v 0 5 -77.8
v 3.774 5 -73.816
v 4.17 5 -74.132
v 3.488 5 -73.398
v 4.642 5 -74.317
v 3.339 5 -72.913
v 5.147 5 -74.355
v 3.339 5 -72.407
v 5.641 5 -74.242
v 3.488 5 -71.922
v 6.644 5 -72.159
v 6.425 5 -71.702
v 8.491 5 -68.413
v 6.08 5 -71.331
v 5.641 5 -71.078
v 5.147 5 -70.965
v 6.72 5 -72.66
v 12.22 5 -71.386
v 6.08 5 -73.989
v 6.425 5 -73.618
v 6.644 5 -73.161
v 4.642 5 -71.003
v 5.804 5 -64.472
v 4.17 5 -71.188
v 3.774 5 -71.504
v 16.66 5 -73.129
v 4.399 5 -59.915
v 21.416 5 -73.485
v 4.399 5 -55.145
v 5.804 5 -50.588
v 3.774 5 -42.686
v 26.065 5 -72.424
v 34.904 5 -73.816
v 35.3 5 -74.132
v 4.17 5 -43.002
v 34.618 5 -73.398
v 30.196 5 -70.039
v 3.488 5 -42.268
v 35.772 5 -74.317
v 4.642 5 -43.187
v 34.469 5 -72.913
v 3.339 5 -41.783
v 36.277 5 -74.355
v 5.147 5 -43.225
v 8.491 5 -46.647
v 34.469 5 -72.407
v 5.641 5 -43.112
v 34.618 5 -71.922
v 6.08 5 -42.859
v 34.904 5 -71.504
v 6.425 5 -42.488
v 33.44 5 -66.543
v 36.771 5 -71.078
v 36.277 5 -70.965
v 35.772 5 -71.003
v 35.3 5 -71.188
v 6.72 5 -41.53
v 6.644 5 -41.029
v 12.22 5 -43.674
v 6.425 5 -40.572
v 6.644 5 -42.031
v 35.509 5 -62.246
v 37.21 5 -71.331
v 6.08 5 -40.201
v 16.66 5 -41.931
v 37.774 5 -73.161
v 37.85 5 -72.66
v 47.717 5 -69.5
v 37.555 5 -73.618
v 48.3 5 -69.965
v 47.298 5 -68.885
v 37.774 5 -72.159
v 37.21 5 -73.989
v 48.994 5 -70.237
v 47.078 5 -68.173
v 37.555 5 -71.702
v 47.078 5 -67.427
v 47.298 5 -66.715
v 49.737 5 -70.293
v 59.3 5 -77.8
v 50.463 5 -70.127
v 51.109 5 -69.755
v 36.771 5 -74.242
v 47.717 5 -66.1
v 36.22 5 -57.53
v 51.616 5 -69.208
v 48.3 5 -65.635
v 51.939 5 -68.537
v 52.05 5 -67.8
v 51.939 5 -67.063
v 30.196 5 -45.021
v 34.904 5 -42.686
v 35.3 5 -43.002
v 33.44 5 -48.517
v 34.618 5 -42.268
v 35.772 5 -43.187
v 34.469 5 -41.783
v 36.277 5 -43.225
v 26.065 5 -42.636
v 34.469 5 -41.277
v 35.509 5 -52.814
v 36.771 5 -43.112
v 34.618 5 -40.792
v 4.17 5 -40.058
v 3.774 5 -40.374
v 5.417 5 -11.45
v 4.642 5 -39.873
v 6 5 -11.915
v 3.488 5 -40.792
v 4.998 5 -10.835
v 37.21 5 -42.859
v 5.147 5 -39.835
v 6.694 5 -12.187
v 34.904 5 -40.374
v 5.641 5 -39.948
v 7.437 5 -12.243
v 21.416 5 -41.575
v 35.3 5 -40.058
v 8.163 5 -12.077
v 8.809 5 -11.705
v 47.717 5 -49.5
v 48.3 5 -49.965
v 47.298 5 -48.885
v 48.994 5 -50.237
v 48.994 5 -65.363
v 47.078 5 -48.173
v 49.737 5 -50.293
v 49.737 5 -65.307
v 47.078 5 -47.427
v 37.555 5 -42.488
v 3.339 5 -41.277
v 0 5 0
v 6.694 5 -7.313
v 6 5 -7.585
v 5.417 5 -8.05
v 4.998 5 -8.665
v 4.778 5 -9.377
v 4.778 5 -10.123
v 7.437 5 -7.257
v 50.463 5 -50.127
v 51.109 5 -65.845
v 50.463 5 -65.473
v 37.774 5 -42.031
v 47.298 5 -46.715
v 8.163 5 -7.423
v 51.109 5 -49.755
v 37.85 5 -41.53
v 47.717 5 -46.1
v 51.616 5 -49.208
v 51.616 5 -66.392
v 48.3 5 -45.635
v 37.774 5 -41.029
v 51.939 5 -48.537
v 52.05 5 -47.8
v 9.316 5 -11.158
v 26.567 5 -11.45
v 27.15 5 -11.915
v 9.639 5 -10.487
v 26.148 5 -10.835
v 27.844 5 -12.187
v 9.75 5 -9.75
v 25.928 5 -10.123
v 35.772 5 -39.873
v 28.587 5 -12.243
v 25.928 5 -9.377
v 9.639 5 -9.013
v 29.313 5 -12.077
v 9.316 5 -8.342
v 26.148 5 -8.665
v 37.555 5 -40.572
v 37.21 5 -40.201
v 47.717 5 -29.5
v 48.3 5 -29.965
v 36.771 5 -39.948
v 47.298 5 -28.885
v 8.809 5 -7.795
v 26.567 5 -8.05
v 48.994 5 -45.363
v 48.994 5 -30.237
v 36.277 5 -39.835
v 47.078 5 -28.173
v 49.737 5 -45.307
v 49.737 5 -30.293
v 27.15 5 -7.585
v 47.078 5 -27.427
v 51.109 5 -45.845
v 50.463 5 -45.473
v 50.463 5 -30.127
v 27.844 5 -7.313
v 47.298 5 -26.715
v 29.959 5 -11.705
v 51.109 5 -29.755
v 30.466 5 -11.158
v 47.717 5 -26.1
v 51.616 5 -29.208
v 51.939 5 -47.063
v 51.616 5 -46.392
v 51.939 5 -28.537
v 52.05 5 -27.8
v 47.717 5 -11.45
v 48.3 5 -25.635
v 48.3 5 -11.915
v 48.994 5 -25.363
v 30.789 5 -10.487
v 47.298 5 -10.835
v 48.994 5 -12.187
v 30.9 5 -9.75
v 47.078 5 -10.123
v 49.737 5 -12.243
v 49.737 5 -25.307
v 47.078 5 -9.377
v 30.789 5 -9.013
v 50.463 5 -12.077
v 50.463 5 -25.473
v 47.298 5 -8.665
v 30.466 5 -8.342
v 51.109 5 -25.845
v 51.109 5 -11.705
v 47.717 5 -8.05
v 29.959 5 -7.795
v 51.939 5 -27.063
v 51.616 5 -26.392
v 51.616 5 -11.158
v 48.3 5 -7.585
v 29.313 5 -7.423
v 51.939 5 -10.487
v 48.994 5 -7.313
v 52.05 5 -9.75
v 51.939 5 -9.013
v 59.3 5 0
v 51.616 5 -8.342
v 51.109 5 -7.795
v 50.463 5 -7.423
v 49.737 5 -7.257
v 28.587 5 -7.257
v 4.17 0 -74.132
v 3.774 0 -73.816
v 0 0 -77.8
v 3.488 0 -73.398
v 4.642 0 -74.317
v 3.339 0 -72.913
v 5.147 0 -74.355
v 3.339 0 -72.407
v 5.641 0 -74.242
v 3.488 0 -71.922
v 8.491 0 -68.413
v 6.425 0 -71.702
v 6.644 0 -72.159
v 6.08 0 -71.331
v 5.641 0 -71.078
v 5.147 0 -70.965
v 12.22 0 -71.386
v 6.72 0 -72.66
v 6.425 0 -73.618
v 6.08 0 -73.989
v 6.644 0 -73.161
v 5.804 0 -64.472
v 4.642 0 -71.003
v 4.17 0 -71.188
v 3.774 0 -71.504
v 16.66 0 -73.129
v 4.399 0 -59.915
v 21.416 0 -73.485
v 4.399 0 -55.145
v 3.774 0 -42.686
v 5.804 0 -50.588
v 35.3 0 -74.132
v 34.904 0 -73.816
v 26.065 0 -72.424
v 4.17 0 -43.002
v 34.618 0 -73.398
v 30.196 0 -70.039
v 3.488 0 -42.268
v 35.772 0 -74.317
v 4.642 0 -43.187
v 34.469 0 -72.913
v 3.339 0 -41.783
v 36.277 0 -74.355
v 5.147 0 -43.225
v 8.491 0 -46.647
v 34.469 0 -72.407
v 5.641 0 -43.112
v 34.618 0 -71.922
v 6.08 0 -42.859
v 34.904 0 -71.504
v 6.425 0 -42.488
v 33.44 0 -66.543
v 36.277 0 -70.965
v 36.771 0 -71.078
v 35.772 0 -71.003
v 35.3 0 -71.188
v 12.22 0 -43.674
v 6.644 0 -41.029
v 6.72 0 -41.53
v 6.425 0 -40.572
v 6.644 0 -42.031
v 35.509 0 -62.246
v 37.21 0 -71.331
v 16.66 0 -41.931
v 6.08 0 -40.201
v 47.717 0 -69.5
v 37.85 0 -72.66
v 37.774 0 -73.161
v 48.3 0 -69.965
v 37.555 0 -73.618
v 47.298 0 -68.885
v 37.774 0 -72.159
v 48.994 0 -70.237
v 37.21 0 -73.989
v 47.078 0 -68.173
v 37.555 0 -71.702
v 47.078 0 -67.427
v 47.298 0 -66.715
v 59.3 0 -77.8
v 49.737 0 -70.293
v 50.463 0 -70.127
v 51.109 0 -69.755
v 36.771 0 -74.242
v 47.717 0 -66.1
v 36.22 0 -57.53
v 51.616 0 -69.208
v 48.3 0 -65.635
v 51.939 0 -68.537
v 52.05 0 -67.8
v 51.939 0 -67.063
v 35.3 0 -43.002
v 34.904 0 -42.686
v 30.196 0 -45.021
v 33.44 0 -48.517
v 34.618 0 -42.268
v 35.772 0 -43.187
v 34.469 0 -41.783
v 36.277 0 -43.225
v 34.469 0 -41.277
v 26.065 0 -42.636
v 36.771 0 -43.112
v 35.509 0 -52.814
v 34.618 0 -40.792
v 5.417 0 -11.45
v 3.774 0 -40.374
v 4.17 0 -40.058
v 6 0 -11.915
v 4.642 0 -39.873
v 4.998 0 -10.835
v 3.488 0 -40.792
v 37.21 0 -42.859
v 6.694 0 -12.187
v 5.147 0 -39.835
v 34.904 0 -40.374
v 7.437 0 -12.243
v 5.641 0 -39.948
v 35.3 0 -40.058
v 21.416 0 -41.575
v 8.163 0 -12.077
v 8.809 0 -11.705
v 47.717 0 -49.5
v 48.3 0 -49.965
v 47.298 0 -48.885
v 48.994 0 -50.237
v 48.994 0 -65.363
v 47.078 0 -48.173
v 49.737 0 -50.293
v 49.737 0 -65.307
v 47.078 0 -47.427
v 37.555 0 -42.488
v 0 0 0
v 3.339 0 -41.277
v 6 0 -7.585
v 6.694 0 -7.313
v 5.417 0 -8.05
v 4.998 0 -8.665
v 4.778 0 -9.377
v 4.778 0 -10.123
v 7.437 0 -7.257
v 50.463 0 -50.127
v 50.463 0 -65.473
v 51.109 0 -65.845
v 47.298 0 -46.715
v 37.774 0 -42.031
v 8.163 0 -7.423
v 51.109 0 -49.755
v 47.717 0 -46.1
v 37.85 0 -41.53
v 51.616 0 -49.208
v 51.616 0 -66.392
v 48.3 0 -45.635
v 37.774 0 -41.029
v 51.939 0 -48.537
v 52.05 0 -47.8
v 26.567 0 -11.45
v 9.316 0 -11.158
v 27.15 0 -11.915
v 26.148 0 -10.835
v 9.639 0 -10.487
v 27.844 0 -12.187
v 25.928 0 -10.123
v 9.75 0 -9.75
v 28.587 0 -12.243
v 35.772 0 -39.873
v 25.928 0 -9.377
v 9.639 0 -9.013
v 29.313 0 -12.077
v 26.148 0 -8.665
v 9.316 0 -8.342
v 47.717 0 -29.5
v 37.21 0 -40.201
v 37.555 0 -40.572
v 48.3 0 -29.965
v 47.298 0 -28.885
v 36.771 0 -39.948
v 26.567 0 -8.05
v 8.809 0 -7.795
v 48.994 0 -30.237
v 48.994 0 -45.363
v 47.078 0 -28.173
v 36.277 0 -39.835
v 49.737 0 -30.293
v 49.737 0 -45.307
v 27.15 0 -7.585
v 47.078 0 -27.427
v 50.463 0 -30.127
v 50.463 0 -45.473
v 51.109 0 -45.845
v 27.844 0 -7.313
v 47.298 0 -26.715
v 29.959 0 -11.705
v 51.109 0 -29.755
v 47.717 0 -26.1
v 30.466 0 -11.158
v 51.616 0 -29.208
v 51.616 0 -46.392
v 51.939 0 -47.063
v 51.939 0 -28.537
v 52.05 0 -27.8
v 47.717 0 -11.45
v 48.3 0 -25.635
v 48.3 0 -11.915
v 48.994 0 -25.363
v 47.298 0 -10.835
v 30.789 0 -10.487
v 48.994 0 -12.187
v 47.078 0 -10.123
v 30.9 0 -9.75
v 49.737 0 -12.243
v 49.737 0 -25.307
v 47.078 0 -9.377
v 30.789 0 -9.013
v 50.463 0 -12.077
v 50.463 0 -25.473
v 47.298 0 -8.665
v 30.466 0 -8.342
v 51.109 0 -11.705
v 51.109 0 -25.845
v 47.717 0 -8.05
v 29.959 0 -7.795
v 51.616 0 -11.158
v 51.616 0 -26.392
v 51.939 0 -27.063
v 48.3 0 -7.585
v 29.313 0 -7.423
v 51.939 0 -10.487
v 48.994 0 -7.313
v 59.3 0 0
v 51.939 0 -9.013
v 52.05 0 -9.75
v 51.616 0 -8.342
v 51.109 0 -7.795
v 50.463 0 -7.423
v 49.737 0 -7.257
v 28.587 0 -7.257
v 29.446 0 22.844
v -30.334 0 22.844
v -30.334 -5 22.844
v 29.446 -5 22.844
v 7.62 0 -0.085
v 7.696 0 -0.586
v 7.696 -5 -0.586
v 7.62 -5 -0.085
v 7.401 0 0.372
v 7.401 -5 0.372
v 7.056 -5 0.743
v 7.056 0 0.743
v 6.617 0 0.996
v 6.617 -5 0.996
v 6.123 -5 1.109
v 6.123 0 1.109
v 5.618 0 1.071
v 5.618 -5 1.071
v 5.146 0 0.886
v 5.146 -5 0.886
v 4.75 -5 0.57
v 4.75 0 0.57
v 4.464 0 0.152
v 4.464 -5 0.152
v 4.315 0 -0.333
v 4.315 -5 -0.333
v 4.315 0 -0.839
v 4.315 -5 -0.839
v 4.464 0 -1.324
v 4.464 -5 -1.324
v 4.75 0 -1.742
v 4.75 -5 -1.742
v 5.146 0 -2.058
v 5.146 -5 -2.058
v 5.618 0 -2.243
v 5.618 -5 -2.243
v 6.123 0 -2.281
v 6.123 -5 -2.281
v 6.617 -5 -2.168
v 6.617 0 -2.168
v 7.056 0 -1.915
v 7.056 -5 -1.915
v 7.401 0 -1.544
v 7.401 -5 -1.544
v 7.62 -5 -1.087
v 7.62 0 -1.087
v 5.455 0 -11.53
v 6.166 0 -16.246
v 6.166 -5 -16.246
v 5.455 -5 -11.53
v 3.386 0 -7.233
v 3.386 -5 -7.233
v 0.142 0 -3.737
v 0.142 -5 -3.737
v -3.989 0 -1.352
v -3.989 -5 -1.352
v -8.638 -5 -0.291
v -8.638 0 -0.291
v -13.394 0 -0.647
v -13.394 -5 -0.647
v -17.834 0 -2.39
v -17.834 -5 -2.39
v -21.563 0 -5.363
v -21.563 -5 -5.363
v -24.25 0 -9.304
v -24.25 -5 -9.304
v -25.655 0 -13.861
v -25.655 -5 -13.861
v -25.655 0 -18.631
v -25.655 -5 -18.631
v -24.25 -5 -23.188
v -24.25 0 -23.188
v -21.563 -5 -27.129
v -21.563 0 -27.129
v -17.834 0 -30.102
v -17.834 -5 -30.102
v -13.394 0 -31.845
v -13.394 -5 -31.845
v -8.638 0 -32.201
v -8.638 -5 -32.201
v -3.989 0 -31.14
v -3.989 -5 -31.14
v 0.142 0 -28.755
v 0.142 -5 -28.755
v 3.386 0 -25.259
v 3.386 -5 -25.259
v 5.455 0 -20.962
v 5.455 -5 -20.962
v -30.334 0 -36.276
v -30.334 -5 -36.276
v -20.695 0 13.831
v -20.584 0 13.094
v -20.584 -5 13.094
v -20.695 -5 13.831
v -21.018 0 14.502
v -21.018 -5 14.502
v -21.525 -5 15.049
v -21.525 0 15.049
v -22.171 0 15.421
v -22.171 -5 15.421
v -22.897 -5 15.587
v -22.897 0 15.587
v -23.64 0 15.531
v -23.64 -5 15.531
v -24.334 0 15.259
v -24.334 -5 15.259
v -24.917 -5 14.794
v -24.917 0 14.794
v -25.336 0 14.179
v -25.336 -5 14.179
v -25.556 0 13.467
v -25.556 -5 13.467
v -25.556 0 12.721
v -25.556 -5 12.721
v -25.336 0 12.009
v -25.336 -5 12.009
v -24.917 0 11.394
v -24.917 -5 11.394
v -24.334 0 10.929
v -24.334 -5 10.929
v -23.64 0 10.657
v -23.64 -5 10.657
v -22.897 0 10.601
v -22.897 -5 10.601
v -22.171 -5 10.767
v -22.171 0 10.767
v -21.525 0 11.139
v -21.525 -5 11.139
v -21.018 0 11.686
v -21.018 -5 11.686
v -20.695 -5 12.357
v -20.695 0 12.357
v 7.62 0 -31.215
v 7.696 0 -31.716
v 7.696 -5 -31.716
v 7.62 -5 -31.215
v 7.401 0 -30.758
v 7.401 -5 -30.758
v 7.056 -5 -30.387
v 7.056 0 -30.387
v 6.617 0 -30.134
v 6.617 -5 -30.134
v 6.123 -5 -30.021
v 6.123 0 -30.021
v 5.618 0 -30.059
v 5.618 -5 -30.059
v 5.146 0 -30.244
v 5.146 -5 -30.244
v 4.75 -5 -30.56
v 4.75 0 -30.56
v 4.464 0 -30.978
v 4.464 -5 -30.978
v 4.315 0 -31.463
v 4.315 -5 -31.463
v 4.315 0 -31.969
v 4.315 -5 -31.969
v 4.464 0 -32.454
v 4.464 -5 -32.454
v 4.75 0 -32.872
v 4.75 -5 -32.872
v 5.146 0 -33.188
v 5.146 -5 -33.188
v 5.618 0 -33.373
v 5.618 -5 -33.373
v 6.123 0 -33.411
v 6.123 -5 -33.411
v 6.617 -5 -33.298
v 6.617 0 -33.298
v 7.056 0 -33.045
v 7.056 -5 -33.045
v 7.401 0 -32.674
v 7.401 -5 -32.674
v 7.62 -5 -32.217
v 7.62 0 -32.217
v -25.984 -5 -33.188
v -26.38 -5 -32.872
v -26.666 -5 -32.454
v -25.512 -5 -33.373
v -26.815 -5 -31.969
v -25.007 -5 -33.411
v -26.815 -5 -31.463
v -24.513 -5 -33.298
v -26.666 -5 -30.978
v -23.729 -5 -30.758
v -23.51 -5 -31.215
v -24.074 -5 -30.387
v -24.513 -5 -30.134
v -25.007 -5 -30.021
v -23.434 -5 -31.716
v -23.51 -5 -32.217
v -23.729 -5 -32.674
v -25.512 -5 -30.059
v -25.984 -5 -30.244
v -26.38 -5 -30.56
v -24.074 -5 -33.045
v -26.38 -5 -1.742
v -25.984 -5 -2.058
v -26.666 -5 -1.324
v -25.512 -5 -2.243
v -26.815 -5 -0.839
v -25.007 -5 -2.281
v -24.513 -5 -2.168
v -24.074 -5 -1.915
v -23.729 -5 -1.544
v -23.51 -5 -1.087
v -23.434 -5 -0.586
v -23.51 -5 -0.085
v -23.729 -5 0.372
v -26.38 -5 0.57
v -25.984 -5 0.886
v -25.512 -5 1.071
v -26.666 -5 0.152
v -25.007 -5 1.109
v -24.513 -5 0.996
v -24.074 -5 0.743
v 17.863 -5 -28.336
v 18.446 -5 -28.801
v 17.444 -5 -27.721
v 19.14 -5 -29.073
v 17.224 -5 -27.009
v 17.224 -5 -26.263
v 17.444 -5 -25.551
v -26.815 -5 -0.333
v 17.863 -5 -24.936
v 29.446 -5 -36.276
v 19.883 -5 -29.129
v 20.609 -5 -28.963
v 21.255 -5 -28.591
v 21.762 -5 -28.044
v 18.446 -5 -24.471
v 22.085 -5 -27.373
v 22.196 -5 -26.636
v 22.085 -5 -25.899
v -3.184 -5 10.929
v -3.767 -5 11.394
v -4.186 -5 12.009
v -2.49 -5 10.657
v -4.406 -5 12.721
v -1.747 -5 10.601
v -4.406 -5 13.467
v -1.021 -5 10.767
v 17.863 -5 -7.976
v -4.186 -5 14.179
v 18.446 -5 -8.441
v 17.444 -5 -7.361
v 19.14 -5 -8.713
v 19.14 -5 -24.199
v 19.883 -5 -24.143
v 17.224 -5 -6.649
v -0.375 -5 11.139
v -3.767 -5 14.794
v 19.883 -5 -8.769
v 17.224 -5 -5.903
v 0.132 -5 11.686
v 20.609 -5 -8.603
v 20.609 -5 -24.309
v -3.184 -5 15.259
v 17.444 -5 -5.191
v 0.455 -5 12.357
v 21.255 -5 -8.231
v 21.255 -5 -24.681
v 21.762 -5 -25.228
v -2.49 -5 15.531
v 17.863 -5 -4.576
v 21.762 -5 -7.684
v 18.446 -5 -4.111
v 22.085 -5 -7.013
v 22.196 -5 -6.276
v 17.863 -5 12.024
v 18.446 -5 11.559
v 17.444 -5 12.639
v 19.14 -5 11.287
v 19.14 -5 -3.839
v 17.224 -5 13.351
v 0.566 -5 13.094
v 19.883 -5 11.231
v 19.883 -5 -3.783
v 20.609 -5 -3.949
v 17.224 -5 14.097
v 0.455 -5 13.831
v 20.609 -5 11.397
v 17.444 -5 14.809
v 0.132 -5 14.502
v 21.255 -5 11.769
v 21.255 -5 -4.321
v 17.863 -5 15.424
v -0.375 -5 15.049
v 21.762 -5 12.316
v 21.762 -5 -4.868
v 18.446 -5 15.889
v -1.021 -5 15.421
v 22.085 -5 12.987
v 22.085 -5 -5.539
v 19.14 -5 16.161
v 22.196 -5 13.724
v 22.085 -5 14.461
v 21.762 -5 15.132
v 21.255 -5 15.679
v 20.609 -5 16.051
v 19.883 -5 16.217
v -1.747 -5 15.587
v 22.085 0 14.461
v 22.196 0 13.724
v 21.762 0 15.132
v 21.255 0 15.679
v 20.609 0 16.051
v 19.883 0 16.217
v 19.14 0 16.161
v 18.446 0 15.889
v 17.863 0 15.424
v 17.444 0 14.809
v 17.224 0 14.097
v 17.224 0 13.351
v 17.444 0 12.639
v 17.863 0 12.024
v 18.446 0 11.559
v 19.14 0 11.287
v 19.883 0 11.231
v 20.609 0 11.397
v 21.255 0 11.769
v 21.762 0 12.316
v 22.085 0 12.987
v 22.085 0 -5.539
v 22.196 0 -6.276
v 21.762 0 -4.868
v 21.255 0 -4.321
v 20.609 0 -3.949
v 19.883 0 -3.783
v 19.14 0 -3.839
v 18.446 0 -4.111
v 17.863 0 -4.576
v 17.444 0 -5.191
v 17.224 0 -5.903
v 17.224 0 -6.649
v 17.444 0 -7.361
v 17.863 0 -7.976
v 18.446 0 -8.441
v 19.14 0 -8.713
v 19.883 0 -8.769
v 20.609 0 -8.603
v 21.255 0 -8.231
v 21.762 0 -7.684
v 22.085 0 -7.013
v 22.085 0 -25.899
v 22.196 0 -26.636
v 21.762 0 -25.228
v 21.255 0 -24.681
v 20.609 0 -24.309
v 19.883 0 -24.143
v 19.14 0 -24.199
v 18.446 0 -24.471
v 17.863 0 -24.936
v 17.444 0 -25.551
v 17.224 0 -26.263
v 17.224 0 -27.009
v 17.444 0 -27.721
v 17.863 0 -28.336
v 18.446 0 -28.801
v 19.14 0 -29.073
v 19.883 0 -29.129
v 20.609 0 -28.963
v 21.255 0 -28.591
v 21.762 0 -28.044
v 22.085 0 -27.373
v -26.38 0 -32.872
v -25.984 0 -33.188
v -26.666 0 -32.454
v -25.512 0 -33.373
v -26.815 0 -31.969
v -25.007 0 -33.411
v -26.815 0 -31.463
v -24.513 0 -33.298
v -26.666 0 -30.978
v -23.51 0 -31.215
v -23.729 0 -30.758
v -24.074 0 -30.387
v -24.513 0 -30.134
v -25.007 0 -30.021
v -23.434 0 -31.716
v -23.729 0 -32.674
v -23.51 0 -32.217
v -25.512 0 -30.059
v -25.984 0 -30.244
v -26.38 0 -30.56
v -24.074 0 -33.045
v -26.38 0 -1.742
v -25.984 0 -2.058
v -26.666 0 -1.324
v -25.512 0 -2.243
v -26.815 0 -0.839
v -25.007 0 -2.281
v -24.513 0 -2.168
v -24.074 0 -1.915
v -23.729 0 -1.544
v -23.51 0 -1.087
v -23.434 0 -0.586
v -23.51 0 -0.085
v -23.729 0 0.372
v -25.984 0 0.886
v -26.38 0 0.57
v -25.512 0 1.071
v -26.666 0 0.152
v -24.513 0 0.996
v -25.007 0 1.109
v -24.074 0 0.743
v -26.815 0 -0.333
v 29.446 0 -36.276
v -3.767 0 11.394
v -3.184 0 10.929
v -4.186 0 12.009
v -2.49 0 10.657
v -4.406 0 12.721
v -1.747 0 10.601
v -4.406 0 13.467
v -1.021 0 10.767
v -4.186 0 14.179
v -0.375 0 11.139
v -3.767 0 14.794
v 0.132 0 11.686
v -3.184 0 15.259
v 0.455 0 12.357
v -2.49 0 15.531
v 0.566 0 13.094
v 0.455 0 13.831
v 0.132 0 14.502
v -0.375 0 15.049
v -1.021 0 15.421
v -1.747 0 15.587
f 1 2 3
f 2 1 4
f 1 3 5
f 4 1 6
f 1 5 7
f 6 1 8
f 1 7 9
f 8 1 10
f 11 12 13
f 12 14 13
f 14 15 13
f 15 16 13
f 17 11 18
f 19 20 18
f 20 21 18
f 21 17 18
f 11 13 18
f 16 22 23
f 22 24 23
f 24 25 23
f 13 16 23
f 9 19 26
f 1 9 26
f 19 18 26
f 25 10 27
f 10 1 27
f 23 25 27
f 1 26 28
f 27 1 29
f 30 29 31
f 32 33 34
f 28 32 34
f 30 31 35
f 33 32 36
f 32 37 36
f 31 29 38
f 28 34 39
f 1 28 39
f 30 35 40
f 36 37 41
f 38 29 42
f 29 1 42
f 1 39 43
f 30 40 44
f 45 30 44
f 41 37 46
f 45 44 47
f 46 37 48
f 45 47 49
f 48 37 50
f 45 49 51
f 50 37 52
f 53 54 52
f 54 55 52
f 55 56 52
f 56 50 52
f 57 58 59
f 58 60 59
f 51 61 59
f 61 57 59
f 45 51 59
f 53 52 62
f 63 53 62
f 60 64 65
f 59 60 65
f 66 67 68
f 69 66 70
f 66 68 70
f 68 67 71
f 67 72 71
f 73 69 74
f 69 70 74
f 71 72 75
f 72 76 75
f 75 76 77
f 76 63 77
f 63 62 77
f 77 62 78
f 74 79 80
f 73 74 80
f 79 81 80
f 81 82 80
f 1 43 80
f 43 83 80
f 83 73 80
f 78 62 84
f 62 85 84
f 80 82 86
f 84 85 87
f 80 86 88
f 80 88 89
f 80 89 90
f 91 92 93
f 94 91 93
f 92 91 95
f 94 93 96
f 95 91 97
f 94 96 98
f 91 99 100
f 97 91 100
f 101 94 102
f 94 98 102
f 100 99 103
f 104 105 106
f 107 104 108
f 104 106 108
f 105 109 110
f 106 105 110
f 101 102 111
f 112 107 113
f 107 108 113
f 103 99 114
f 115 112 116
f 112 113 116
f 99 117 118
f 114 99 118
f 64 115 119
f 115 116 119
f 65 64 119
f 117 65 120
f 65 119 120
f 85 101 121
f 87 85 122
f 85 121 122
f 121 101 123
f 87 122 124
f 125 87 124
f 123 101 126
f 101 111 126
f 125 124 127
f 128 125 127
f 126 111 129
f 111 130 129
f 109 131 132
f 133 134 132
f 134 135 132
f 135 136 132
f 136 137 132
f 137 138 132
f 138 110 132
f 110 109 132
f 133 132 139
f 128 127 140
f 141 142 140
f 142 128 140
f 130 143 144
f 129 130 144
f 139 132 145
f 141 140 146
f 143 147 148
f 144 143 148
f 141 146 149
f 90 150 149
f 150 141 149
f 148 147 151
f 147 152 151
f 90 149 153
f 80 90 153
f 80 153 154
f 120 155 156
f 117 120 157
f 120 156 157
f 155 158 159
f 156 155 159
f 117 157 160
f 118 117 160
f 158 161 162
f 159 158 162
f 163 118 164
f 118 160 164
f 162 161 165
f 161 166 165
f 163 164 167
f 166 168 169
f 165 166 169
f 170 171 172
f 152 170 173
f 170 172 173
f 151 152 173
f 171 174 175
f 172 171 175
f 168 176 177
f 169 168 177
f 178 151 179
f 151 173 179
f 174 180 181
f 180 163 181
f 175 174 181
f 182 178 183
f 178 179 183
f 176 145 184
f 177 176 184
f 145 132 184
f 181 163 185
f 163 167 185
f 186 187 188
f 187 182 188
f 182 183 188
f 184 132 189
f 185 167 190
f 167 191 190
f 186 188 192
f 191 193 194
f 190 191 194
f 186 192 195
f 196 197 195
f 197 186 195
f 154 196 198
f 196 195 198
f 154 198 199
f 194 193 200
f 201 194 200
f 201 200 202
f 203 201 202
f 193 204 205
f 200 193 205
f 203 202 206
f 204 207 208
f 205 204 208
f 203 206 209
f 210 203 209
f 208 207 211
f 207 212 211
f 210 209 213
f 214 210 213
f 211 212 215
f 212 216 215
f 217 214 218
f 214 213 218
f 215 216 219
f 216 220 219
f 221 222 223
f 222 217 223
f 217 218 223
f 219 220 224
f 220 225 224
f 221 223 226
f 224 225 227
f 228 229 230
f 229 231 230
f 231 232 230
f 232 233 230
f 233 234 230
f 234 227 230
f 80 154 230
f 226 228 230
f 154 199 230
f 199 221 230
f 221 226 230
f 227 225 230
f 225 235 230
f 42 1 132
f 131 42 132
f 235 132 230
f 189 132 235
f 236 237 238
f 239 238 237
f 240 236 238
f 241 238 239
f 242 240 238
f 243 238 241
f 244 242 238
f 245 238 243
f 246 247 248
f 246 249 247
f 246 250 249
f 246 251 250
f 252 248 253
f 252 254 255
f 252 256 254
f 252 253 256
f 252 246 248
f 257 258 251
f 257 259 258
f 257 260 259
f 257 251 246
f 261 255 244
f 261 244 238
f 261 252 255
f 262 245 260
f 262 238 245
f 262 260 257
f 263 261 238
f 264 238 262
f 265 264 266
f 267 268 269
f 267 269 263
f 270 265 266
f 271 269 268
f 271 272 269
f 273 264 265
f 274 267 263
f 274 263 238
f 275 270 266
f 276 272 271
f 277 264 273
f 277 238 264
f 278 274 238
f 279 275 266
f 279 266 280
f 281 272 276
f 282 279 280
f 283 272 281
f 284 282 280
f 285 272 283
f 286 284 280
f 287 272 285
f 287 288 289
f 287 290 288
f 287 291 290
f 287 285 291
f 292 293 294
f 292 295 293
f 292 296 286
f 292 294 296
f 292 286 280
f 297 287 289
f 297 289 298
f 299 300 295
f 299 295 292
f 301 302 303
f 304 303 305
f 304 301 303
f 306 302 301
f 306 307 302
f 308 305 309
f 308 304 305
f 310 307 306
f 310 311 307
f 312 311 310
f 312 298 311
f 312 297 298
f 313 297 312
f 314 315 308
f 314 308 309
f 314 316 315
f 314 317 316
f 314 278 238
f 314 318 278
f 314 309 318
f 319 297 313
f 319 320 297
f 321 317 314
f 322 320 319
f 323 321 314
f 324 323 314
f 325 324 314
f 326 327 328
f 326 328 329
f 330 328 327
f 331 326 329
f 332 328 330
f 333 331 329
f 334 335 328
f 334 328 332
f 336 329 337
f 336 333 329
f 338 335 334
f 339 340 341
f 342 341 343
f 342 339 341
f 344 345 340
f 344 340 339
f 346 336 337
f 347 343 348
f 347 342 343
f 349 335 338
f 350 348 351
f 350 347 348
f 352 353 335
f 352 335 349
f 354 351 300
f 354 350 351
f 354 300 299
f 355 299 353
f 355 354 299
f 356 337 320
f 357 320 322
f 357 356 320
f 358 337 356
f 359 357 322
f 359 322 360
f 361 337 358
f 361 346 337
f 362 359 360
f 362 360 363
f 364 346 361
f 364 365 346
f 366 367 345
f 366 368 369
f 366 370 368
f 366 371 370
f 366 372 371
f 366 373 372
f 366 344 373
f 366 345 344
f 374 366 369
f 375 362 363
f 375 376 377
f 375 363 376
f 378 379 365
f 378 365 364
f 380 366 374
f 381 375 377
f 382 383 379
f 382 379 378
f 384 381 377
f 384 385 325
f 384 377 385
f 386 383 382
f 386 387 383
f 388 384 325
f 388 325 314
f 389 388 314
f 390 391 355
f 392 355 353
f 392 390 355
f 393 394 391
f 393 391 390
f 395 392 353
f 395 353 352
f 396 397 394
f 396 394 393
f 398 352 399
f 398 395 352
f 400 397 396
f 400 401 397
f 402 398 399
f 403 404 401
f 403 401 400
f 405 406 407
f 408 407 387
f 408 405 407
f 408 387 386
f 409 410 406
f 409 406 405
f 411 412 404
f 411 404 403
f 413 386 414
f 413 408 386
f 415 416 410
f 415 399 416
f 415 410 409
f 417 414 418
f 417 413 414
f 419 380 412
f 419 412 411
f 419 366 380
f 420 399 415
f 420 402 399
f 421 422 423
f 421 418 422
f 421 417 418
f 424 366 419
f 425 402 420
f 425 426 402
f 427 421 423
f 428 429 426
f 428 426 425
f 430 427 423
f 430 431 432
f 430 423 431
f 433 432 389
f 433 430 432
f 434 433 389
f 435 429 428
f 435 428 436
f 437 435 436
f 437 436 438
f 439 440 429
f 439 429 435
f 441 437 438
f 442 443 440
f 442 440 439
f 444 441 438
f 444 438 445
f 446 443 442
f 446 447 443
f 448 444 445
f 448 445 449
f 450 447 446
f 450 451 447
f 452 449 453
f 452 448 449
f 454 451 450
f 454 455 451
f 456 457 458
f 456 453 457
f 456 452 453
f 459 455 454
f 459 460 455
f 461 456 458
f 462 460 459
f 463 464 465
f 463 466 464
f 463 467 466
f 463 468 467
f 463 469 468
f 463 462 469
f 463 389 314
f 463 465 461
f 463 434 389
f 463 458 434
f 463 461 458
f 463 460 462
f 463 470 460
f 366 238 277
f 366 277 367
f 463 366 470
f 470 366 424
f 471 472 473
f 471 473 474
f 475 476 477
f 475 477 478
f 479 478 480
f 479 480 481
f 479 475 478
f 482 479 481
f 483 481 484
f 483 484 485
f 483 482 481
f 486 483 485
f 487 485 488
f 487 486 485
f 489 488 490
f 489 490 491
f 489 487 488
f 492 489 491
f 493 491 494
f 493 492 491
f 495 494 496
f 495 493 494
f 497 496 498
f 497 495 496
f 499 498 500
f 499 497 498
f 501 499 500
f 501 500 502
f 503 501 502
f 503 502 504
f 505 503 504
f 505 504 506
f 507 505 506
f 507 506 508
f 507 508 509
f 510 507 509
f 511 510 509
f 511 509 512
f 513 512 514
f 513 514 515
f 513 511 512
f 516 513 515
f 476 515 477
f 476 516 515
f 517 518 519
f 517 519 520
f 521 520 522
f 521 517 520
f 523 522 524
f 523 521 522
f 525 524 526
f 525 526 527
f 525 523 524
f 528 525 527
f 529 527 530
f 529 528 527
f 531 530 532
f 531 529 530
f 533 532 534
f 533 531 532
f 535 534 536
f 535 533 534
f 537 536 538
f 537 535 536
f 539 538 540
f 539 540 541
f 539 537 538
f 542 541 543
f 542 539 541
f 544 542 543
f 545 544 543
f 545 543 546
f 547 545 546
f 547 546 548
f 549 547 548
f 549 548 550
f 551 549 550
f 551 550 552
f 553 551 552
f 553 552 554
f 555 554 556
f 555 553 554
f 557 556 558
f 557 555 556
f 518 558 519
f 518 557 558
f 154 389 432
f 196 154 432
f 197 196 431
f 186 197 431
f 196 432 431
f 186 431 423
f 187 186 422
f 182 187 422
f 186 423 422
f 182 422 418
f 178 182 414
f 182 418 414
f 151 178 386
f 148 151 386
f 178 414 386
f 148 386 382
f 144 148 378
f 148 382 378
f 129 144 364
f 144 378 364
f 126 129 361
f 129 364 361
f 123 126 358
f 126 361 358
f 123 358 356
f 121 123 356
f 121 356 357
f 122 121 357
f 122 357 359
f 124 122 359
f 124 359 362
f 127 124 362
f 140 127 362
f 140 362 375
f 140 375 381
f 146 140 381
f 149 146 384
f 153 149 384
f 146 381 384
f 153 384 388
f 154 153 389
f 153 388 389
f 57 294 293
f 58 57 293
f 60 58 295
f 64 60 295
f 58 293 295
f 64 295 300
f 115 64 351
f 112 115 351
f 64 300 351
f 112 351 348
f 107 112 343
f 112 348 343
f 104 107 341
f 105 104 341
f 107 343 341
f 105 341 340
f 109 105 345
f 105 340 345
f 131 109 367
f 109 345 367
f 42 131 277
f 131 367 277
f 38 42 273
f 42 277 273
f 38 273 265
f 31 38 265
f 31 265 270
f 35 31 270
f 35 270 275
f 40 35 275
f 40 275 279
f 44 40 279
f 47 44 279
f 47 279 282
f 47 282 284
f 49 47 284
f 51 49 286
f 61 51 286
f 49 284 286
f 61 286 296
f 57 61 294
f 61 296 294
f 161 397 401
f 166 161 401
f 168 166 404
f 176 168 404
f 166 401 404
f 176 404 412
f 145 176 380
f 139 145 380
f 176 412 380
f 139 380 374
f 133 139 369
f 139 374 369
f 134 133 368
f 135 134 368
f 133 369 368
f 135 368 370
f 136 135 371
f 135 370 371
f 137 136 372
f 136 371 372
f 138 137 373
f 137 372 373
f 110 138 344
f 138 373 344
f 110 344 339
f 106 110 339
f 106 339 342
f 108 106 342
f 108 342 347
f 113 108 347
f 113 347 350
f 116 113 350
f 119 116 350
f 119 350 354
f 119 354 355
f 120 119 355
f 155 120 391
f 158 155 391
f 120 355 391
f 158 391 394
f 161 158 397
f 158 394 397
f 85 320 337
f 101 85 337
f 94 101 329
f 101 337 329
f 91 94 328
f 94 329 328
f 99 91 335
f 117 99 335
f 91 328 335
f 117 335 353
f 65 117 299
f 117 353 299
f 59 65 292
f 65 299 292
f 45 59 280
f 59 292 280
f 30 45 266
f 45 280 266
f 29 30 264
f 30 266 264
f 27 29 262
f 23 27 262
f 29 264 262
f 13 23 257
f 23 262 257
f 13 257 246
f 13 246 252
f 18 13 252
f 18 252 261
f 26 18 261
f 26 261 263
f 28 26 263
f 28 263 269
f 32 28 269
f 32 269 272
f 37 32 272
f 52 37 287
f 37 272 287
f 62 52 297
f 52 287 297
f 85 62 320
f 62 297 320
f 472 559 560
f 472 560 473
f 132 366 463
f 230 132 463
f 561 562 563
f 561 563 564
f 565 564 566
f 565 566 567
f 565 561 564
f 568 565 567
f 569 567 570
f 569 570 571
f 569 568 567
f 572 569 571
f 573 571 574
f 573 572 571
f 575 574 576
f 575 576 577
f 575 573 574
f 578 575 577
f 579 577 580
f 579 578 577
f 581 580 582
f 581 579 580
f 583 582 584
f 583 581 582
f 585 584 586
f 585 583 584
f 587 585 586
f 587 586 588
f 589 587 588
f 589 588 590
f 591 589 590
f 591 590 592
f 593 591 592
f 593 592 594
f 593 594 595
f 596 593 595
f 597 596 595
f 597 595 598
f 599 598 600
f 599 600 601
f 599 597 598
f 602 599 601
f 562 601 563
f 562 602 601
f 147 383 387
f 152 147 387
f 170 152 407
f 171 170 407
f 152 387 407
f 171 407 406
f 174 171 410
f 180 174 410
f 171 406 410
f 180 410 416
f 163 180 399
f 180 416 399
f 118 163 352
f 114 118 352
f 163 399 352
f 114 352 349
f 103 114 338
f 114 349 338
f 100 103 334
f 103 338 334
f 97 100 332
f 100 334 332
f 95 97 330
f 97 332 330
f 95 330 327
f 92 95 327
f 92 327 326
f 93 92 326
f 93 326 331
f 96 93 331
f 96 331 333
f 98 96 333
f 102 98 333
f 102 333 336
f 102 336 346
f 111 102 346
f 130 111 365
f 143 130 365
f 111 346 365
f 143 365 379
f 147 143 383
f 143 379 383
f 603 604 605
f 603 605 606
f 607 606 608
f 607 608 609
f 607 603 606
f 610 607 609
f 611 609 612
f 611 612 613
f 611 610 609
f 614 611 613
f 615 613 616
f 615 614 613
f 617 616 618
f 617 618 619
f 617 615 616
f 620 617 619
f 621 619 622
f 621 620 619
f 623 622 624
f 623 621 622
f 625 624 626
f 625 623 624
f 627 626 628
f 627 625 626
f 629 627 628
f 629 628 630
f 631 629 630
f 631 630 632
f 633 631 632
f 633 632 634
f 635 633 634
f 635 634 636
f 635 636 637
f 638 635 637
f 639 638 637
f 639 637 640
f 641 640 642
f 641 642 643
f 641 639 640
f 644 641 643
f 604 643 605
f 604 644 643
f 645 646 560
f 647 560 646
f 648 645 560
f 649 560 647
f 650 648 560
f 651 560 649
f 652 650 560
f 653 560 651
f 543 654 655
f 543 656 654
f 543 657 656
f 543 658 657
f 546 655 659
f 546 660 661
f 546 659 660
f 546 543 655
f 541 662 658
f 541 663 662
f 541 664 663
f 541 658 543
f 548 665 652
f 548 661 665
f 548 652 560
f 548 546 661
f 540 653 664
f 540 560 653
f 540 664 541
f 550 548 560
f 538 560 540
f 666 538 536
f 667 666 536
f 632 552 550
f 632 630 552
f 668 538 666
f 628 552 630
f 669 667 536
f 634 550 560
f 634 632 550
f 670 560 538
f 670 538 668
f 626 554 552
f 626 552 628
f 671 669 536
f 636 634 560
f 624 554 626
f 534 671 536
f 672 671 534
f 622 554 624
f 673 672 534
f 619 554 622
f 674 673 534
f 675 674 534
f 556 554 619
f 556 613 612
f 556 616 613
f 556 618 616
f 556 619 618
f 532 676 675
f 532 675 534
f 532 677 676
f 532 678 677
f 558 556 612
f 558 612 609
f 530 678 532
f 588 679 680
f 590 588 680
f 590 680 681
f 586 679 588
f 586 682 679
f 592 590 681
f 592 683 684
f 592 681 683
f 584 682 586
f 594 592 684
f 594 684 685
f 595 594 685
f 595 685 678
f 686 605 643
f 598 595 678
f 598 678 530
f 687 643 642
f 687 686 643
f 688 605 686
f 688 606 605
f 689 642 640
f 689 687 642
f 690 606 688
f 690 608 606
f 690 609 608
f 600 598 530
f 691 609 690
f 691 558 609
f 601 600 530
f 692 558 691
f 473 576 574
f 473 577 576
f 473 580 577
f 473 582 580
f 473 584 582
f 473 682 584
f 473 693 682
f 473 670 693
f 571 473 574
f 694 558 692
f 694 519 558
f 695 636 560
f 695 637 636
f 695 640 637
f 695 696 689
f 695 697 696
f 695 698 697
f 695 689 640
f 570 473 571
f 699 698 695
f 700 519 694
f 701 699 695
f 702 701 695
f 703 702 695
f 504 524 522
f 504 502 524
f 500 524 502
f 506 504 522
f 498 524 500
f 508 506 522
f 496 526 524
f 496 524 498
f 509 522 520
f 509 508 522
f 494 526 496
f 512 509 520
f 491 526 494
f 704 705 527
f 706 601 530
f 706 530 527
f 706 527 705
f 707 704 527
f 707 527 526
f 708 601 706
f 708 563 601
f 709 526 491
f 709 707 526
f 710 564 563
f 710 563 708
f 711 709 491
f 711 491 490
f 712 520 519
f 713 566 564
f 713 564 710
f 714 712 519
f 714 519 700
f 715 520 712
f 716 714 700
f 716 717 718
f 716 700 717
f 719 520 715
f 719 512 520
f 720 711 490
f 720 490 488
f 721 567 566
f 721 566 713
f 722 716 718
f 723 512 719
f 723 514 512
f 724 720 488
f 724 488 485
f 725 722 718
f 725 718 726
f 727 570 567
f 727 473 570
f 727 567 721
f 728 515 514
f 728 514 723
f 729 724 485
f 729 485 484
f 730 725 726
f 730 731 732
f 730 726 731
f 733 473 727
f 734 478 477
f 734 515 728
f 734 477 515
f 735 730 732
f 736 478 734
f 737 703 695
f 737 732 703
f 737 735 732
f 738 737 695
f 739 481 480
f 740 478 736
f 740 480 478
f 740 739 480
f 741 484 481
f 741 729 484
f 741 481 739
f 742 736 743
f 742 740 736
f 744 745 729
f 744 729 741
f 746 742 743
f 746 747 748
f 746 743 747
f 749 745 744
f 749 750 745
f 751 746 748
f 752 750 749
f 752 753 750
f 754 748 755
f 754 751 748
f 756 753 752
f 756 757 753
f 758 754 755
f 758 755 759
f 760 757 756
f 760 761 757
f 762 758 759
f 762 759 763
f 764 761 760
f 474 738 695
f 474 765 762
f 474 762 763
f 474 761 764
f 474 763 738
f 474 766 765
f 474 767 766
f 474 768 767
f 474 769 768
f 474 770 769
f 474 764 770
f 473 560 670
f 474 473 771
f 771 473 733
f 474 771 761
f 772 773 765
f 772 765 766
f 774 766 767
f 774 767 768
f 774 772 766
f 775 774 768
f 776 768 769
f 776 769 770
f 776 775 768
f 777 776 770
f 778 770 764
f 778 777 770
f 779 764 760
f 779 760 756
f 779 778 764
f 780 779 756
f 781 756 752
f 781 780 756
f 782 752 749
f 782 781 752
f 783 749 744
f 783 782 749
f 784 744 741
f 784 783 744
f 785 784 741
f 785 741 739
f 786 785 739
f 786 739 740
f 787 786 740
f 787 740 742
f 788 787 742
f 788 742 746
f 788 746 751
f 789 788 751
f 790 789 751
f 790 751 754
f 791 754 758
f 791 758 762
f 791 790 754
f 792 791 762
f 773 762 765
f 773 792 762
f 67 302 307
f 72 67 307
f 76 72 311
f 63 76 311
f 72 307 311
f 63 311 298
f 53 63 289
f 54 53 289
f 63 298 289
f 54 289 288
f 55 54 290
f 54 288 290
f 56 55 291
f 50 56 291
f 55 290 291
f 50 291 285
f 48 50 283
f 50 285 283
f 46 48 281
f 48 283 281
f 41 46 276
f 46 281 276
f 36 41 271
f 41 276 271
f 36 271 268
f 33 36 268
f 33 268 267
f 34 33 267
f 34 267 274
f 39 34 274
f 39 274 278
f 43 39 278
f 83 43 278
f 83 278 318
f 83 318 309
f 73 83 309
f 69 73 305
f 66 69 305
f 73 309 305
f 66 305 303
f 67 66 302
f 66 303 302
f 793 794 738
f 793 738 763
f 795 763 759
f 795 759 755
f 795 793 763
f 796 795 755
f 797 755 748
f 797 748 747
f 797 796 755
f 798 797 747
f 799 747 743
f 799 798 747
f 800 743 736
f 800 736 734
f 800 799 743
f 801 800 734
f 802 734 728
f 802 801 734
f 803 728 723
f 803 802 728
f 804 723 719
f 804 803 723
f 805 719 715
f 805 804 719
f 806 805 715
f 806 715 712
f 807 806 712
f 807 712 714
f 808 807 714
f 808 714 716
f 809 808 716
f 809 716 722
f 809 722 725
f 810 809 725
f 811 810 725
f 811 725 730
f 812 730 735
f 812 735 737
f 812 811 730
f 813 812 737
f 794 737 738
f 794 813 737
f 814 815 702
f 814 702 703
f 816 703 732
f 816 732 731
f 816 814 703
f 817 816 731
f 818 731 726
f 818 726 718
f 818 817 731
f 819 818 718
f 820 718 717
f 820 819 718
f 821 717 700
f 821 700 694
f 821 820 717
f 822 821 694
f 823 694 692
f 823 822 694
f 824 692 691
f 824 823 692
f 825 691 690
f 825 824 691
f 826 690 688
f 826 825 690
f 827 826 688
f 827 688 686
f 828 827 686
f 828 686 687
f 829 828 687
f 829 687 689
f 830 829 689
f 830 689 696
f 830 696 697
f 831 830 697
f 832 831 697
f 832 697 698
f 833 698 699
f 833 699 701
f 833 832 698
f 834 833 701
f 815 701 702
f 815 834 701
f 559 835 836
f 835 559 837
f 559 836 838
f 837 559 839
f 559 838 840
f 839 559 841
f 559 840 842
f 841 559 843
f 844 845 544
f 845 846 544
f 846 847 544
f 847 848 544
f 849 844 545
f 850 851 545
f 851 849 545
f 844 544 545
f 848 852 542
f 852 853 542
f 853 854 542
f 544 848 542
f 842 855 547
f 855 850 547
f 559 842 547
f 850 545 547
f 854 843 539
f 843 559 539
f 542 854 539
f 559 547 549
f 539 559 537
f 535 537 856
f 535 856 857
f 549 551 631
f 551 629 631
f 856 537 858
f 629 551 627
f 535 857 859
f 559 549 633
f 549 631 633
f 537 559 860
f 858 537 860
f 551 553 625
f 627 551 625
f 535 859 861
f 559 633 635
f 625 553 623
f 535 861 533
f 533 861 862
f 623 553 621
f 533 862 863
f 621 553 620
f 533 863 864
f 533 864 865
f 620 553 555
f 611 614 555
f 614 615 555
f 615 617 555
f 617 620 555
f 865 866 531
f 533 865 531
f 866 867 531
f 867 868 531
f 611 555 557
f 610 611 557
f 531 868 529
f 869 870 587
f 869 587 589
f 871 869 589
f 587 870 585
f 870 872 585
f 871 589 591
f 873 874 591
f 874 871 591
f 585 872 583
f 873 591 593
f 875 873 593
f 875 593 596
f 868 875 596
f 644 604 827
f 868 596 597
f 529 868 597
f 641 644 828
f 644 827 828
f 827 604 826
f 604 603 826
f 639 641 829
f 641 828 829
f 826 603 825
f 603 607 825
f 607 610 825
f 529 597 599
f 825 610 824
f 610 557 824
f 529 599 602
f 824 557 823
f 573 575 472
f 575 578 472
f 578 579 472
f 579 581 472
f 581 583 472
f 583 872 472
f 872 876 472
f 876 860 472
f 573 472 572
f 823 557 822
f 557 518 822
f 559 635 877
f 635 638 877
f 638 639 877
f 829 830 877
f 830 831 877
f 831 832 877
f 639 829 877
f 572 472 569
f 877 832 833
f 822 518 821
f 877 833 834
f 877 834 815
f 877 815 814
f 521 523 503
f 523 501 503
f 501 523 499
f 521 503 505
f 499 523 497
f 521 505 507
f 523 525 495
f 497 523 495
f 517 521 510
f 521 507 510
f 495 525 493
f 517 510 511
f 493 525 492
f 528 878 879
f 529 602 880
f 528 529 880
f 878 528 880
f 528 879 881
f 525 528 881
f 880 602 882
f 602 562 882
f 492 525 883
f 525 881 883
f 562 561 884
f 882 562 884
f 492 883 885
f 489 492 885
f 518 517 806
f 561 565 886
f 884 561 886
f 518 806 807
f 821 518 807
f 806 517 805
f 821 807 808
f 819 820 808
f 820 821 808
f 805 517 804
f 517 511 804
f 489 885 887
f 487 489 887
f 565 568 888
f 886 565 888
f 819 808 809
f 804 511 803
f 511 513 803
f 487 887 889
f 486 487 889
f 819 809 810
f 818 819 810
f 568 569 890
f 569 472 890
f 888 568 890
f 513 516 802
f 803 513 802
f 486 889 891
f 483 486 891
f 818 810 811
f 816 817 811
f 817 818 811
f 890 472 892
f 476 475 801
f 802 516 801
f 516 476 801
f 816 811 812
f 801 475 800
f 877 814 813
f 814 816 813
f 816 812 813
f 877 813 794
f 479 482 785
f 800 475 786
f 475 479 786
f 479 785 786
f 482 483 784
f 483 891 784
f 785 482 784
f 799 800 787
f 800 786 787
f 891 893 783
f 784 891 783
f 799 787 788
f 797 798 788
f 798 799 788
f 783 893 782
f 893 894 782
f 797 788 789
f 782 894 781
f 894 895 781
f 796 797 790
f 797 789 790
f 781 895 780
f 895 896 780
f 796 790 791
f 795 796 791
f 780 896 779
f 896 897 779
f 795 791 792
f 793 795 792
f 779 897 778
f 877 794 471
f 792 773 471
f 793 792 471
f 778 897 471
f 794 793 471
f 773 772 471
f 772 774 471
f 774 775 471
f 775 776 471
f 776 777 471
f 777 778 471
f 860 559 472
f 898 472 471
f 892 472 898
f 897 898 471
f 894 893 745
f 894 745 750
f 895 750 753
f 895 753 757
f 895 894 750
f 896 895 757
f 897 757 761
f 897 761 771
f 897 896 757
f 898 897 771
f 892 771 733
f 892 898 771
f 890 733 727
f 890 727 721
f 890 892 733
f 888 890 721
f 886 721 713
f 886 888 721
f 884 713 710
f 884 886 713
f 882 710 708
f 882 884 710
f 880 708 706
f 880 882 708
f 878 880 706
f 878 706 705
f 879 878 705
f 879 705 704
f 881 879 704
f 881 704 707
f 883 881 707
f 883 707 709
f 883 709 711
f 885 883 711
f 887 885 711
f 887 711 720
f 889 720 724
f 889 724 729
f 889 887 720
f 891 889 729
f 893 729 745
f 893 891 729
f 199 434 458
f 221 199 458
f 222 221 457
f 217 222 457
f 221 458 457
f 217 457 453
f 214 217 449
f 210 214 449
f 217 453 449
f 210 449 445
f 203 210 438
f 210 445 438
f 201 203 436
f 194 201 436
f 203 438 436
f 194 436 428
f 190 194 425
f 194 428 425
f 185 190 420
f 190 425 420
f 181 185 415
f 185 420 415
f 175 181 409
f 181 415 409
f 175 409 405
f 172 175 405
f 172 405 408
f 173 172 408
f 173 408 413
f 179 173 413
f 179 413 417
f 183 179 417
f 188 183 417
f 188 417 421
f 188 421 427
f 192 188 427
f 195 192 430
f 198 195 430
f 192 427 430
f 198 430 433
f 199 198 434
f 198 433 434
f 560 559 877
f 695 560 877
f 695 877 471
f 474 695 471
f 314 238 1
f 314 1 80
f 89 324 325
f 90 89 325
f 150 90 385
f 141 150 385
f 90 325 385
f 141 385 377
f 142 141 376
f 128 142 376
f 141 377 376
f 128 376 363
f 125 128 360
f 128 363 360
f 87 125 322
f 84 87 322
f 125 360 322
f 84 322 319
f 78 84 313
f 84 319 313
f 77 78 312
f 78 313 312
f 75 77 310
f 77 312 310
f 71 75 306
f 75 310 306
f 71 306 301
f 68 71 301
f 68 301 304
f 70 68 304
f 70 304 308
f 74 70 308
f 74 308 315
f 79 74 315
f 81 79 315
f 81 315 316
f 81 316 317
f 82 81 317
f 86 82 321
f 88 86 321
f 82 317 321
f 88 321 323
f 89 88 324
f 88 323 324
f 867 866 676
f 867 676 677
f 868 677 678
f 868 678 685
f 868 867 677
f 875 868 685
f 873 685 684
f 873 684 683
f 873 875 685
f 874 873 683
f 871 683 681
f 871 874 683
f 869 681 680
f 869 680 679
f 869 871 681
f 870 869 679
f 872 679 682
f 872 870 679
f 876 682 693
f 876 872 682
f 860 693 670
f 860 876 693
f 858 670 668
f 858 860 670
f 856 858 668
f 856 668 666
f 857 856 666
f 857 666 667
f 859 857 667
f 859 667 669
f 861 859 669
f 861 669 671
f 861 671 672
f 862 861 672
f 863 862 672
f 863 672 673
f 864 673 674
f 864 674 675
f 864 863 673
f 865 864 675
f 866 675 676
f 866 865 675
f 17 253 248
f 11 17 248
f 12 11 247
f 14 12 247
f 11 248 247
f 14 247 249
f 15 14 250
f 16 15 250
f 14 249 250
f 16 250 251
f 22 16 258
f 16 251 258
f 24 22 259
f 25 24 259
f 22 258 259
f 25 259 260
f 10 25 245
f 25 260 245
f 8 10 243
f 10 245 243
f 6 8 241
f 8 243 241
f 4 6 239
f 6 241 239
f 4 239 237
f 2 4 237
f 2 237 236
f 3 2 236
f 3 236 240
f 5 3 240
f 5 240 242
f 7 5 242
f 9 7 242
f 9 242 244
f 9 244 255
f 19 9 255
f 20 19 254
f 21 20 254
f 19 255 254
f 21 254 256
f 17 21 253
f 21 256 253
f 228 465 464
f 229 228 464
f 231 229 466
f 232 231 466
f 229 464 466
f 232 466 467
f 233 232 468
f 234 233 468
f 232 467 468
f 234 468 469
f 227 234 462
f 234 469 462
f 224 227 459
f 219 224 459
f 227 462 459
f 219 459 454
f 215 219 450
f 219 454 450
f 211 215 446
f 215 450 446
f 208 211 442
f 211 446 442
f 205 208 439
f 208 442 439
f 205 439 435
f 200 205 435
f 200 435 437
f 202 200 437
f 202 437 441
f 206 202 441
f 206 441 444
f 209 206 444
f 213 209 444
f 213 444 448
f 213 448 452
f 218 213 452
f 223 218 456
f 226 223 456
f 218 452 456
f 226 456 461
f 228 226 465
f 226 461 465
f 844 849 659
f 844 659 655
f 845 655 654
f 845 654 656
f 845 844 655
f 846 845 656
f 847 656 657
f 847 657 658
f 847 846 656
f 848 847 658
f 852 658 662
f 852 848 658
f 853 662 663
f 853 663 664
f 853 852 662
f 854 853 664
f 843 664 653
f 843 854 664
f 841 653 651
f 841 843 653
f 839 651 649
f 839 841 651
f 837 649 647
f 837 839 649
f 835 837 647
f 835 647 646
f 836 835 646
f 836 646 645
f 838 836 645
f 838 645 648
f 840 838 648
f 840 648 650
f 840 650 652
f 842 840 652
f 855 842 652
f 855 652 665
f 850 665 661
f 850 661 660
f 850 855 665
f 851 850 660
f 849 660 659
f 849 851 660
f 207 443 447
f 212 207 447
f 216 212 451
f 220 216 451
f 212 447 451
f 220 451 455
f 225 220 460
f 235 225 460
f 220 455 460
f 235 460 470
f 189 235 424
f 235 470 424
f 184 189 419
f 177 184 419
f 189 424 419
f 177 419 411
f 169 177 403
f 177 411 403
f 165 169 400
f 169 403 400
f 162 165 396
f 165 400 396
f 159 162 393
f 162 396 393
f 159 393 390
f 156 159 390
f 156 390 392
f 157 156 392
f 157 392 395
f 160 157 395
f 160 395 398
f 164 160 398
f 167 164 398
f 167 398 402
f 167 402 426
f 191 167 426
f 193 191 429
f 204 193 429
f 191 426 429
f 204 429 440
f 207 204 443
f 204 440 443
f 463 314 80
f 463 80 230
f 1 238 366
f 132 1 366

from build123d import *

# Parameters (mm, degrees)
F0_W     = 59.3
F0_H     = 77.8
F0_R     = 1.7
F0_R_2   = 16
F0_R_3   = 2.5
F1_DEPTH = 5
F2_W     = 59.78
F2_H     = 59.12
F2_R     = 1.7
F2_R_2   = 16
F2_R_3   = 2.5
F3_DEPTH = 5


with BuildPart() as f1:
    # F0 (on Front) → F1 (new body)
    with BuildSketch(Plane.XZ):
        with Locations((29.65, -38.9)):
            Rectangle(F0_W, F0_H)
        with Locations((5.02, -72.66)):
            Circle(F0_R, mode=Mode.SUBTRACT)
        with Locations((5.02, -41.53)):
            Circle(F0_R, mode=Mode.SUBTRACT)
        with Locations((20.22, -57.53)):
            Circle(F0_R_2, mode=Mode.SUBTRACT)
        with Locations((36.15, -72.66)):
            Circle(F0_R, mode=Mode.SUBTRACT)
        with Locations((49.55, -67.8)):
            Circle(F0_R_3, mode=Mode.SUBTRACT)
        with Locations((36.15, -41.53)):
            Circle(F0_R, mode=Mode.SUBTRACT)
        with Locations((49.55, -47.8)):
            Circle(F0_R_3, mode=Mode.SUBTRACT)
        with Locations((7.25, -9.75)):
            Circle(F0_R_3, mode=Mode.SUBTRACT)
        with Locations((28.4, -9.75)):
            Circle(F0_R_3, mode=Mode.SUBTRACT)
        with Locations((49.55, -27.8)):
            Circle(F0_R_3, mode=Mode.SUBTRACT)
        with Locations((49.55, -9.75)):
            Circle(F0_R_3, mode=Mode.SUBTRACT)
    extrude(amount=-F1_DEPTH)


with BuildPart() as f3:
    # F2 (on Front) → F3 (new body)
    with BuildSketch(Plane.XZ):
        with Locations((-0.444, -6.716)):
            Rectangle(F2_W, F2_H)
        with Locations((-25.134, -31.716)):
            Circle(F2_R, mode=Mode.SUBTRACT)
        with Locations((-9.834, -16.246)):
            Circle(F2_R_2, mode=Mode.SUBTRACT)
        with Locations((5.996, -31.716)):
            Circle(F2_R, mode=Mode.SUBTRACT)
        with Locations((19.696, -26.636)):
            Circle(F2_R_3, mode=Mode.SUBTRACT)
        with Locations((-25.134, -0.586)):
            Circle(F2_R, mode=Mode.SUBTRACT)
        with Locations((-23.084, 13.094)):
            Circle(F2_R_3, mode=Mode.SUBTRACT)
        with Locations((-1.934, 13.094)):
            Circle(F2_R_3, mode=Mode.SUBTRACT)
        with Locations((5.996, -0.586)):
            Circle(F2_R, mode=Mode.SUBTRACT)
        with Locations((19.696, -6.276)):
            Circle(F2_R_3, mode=Mode.SUBTRACT)
        with Locations((19.696, 13.724)):
            Circle(F2_R_3, mode=Mode.SUBTRACT)
    extrude(amount=F3_DEPTH)


solid = Compound([f1.part, f3.part])
